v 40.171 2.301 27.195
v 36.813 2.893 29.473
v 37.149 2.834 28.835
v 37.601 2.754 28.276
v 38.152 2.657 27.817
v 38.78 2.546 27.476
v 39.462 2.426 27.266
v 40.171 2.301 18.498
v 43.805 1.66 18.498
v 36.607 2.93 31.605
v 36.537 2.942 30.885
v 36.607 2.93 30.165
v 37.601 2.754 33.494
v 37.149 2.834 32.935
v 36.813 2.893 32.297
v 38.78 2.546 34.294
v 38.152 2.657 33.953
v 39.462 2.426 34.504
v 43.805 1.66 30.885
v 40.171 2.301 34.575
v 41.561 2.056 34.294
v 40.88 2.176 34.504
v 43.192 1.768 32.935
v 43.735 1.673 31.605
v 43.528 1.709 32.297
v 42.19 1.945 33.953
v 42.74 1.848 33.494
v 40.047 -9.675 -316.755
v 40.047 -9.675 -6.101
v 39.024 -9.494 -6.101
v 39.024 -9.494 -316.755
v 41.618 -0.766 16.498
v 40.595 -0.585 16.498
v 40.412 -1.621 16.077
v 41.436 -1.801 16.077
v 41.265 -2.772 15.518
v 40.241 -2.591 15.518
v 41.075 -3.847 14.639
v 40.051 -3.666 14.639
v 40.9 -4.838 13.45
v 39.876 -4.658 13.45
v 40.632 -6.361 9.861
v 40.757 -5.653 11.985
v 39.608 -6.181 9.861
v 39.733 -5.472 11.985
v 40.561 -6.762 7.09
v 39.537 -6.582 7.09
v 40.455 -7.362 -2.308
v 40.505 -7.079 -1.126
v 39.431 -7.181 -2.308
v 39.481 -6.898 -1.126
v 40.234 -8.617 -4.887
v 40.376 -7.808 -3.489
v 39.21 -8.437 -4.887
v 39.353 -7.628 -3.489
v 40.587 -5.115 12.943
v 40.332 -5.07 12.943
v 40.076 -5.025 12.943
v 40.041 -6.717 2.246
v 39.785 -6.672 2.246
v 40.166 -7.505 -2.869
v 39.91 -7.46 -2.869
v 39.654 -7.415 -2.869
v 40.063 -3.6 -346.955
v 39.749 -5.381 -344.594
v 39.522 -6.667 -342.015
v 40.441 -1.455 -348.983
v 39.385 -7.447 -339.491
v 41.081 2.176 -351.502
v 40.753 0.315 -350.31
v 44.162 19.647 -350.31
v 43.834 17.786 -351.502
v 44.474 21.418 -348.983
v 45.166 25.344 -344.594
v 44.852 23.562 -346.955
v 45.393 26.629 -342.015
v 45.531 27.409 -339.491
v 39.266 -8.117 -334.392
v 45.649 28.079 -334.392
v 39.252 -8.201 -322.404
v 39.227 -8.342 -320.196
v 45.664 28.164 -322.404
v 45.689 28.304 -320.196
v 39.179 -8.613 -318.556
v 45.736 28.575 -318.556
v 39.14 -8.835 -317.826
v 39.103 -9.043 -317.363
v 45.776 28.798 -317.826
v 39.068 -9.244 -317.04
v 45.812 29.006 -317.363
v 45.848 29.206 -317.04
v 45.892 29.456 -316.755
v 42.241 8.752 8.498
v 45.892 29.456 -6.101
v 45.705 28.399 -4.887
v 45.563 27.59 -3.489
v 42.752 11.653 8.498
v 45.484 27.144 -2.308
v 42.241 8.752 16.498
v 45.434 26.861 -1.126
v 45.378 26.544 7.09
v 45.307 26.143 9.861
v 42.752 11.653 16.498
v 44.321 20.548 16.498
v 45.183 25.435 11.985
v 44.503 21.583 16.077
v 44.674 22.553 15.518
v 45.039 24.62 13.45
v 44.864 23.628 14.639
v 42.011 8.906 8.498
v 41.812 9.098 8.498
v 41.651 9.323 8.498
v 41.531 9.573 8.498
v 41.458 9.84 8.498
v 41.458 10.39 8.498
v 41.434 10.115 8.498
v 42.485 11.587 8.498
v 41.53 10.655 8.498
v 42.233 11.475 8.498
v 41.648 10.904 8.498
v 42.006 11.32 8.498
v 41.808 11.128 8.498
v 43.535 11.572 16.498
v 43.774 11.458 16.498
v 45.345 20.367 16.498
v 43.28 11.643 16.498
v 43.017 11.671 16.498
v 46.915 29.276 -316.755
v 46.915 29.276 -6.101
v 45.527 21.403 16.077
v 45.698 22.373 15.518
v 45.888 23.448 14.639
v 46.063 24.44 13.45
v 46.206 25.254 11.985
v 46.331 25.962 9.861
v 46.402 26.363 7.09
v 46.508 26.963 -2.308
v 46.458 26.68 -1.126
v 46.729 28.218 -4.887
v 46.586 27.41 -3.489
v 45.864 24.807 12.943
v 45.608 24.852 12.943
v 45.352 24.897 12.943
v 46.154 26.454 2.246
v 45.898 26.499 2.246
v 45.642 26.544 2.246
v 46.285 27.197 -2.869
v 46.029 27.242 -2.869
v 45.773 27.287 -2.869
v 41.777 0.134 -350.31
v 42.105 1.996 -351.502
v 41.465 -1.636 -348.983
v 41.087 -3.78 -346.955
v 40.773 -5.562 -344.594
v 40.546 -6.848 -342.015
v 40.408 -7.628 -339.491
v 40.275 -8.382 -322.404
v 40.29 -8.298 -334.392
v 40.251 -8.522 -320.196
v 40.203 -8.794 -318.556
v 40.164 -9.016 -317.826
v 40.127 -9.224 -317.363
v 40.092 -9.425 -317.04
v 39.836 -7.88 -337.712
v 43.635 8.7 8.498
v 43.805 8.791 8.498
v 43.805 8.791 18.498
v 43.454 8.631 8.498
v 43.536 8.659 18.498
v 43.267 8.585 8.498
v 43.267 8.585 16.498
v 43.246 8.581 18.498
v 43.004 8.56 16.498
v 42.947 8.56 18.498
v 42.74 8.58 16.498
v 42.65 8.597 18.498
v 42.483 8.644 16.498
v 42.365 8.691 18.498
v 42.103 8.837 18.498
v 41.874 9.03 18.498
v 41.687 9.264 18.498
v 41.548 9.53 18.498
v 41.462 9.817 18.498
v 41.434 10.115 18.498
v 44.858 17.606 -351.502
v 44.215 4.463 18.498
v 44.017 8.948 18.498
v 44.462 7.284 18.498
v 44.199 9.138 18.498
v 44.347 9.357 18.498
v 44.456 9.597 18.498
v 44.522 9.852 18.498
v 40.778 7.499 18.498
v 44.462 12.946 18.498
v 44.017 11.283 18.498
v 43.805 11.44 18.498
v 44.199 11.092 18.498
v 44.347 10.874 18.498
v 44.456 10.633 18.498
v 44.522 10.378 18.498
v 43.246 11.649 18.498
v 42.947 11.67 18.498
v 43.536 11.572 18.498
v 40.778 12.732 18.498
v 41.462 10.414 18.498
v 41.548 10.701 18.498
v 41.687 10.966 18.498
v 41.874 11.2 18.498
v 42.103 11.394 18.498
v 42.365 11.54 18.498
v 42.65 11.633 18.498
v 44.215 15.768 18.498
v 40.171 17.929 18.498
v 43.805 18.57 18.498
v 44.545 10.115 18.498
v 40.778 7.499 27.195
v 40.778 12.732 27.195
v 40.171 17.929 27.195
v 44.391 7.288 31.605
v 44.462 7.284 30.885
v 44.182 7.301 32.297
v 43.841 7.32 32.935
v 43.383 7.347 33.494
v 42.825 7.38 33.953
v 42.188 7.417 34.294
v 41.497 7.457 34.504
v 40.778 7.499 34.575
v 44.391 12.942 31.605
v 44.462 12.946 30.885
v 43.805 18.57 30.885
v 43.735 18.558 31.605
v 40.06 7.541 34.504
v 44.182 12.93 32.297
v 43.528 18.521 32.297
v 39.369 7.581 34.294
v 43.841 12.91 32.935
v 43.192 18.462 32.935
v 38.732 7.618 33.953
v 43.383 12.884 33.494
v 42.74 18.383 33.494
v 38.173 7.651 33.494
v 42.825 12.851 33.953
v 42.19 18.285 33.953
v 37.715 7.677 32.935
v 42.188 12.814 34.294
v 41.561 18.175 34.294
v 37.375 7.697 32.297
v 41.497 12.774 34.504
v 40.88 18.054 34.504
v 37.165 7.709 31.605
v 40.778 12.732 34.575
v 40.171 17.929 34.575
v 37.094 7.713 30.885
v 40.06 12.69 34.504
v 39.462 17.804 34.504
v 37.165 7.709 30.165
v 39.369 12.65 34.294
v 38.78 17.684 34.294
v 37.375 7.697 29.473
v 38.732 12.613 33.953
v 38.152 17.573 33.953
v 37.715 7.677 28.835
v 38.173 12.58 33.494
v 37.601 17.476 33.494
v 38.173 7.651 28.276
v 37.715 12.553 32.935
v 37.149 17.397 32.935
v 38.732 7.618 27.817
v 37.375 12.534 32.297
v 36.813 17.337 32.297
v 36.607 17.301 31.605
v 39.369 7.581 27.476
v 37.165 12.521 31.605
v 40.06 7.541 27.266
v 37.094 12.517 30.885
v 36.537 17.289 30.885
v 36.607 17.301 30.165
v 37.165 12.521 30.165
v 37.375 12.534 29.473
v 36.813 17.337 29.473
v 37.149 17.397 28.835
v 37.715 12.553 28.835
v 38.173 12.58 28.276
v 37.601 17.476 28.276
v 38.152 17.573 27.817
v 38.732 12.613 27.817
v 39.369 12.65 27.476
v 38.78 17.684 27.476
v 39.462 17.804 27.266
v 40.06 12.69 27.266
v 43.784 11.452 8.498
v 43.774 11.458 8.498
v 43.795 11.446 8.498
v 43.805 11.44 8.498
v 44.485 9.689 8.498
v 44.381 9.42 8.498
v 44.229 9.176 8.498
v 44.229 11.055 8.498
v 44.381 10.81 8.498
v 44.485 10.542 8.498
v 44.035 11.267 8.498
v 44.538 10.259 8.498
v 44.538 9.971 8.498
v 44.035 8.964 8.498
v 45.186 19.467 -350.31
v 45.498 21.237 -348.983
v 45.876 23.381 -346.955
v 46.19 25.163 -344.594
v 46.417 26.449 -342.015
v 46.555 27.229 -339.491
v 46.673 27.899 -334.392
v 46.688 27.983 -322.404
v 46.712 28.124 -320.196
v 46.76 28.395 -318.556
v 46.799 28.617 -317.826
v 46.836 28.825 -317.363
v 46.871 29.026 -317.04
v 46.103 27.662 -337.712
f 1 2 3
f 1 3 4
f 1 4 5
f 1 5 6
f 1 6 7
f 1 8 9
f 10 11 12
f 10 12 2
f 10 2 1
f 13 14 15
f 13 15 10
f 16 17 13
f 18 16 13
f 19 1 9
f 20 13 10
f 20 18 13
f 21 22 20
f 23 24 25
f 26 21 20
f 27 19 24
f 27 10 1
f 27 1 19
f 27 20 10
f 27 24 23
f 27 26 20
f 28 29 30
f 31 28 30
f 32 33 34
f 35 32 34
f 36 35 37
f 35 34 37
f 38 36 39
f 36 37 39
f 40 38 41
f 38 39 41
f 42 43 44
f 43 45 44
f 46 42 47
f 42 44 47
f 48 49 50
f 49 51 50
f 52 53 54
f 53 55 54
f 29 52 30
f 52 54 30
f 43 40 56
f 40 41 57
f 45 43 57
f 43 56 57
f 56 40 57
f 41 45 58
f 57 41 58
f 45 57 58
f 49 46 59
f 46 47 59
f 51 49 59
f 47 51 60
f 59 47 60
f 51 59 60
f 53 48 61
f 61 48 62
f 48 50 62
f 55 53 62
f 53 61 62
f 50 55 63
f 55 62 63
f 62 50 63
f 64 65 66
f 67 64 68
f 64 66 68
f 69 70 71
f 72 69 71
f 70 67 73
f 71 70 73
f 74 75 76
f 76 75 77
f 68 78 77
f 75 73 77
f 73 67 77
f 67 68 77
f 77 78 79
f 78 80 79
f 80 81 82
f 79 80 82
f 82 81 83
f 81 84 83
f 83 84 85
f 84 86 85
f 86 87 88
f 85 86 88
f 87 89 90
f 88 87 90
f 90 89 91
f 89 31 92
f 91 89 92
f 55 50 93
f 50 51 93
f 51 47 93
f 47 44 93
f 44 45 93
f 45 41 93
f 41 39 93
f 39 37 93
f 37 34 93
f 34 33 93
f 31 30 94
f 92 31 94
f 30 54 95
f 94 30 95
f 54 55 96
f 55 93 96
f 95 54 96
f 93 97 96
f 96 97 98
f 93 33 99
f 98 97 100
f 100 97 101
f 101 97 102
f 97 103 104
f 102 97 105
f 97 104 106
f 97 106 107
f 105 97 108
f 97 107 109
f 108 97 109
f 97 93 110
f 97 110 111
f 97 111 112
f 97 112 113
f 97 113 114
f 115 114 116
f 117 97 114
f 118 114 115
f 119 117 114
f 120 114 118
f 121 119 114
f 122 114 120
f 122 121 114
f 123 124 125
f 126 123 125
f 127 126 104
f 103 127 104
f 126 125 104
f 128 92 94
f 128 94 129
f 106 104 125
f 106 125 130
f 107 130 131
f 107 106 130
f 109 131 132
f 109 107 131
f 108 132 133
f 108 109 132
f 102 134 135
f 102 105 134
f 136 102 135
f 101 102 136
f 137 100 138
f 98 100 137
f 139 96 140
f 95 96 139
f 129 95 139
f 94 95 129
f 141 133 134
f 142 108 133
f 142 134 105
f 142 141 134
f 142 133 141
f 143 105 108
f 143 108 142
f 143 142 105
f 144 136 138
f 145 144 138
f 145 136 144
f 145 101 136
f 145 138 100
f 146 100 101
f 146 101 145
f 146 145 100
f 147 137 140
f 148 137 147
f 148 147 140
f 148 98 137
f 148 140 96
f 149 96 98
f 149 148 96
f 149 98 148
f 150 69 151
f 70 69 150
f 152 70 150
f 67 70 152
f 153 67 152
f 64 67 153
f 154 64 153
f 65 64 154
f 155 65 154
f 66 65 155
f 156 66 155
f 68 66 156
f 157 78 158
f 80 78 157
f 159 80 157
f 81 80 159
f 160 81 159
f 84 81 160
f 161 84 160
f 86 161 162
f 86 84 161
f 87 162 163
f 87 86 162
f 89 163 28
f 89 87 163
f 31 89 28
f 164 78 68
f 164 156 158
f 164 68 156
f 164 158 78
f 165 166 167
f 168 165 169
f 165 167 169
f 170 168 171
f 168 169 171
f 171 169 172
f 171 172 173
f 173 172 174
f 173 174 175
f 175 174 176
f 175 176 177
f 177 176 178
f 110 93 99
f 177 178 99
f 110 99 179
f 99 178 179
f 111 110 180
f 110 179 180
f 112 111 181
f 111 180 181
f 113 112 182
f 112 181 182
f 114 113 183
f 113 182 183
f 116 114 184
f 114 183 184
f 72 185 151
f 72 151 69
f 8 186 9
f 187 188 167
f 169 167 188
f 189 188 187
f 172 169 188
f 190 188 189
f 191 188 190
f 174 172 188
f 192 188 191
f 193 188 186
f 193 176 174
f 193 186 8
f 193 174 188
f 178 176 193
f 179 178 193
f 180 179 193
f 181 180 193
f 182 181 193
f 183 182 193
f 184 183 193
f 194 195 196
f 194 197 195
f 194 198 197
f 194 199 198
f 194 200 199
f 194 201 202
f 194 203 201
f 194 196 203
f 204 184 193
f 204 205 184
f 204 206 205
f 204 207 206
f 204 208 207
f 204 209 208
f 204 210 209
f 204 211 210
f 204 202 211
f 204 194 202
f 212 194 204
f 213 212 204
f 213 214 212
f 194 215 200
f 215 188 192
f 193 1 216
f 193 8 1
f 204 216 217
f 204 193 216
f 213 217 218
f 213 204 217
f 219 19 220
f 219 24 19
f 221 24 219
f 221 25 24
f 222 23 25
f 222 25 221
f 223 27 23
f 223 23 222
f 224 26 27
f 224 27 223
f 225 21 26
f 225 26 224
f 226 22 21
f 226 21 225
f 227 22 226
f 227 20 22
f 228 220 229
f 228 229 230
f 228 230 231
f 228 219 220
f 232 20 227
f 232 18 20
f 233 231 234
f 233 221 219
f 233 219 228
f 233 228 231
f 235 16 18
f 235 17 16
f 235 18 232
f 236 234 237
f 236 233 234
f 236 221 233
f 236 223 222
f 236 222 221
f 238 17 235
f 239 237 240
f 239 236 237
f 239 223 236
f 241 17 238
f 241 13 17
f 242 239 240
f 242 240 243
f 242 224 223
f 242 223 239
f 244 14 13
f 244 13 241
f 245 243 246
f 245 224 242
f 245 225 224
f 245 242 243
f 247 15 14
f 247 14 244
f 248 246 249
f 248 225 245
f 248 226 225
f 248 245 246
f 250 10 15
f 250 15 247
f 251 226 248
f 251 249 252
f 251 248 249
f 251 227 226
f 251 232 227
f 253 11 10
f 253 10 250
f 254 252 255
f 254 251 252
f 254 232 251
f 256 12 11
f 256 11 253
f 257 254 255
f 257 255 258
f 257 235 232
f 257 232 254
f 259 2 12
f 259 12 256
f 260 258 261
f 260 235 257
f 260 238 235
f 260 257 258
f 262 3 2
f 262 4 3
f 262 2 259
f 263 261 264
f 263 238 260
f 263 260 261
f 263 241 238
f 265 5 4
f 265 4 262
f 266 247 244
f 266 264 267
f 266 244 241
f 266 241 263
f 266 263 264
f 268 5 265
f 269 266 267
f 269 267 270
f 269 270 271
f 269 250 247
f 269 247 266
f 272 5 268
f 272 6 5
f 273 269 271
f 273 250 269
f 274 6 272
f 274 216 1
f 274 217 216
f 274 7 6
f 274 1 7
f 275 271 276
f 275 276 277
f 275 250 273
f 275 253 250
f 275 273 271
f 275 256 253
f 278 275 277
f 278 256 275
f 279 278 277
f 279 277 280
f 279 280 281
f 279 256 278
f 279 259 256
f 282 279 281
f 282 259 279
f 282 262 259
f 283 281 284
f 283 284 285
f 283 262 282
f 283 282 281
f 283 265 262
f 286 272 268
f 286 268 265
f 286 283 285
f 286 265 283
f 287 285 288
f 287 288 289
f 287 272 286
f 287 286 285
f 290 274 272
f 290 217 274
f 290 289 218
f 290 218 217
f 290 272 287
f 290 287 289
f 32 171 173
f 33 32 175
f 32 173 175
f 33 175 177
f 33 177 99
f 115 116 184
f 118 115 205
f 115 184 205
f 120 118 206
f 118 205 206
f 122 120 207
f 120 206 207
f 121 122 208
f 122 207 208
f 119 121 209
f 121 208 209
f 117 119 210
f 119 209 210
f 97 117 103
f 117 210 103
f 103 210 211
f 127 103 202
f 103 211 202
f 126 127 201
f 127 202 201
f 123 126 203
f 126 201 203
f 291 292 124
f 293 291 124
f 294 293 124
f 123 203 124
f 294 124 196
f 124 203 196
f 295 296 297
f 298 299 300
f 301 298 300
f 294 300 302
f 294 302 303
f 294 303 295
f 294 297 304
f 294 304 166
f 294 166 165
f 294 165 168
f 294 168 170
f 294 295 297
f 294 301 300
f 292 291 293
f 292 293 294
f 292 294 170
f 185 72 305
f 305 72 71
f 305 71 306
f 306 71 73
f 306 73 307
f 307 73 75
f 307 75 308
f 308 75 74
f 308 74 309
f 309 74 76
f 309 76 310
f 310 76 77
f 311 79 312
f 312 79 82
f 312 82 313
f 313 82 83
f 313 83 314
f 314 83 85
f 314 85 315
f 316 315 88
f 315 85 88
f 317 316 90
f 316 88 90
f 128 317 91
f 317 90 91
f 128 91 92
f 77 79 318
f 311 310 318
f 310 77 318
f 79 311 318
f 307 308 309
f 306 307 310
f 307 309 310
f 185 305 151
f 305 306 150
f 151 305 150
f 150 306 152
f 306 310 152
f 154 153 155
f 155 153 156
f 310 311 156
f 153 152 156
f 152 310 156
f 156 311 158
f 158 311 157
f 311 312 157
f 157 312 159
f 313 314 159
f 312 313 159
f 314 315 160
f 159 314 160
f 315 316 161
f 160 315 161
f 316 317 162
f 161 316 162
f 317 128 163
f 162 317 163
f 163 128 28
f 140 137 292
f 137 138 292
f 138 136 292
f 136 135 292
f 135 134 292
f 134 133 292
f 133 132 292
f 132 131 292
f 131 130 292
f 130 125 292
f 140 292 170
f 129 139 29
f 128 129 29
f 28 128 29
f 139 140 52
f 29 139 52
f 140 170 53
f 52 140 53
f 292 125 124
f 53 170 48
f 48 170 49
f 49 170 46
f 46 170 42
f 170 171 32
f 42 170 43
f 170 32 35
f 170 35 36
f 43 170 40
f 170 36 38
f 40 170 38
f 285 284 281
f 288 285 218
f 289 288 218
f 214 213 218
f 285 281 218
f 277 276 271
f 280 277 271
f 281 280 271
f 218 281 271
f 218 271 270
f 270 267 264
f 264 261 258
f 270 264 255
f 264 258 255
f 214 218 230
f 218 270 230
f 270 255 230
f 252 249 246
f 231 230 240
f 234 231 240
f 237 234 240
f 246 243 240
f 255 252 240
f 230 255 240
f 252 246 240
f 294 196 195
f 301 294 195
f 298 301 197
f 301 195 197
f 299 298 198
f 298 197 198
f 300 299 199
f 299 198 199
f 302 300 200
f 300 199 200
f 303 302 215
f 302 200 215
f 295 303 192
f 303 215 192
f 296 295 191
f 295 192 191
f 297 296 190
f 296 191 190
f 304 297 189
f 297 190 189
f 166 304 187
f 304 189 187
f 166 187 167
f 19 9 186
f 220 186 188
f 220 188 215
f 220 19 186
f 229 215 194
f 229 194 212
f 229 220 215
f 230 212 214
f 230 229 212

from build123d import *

# Parameters (mm, degrees)
REVOLVE_1_ANGLE          = 20
EXTRUDE_1_DEPTH          = 10
EXTRUDE_2_DEPTH          = 360
EXTRUDE_2_DEPTH_BACK     = 8
CUT_EXTRUDE_1_DEPTH      = 354.460525949
CUT_EXTRUDE_1_DEPTH_BACK = 354.460525949
CUT_EXTRUDE_2_DEPTH      = 354.460526061
CUT_EXTRUDE_2_DEPTH_BACK = 354.460526061


# Read off the part's stored shape, not the designer's step: 旋转1
with BuildPart() as part:
    # 旋转1 outline → 旋转1 (revolve)
    with BuildSketch(Plane(origin=(-4.145534285, 10.115302746, 0), x_dir=(0.9848077530122078, -0.17364817766693175, 0), z_dir=(-0.17364817766693175, -0.9848077530122078, 0))):
        with BuildLine():
            Line((48.69007377, 18.497782452), (48.69007377, 30.884801913))
            ThreePointArc((48.69007377, 30.884801913), (42.390721279, 33.49407915), (44.999998514, 27.194726658))
            Line((44.999998514, 27.194726658), (44.999998514, 18.497782452))
            Line((44.999998514, 18.497782452), (48.69007377, 18.497782452))
        make_face()
    revolve(axis=Axis((-4.145534285, 10.115302746, 0), (0, 0, 1)), revolution_arc=REVOLVE_1_ANGLE)

    # 草图2 → 凸台-拉伸1 (add)
    with BuildSketch(Plane(origin=(0, 0, 18.497782452), x_dir=(-1, 0, 0), z_dir=(0, 0, -1))):
        with BuildLine():
            Line((-43.804827858, 10.115302746), (-43.804827858, 8.790890094))
            ThreePointArc((-43.804827858, 8.790890094), (-42.230547682, 8.757264374), (-41.433540442, 10.115302746))
            Line((-41.433540442, 10.115302746), (-43.804827858, 10.115302746))
        make_face()
        with BuildLine():
            Line((-43.804827858, 11.439715397), (-43.804827858, 10.115302746))
            Line((-43.804827858, 10.115302746), (-41.433540442, 10.115302746))
            ThreePointArc((-41.433540442, 10.115302746), (-42.230547682, 11.473341118), (-43.804827858, 11.439715397))
        make_face()
        with BuildLine():
            ThreePointArc((-43.804827858, 11.439715397), (-44.544539485, 10.115302746), (-43.804827858, 8.790890094))
            Line((-43.804827858, 8.790890094), (-43.804827858, 10.115302746))
            Line((-43.804827858, 10.115302746), (-43.804827858, 11.439715397))
        make_face()
    extrude(amount=EXTRUDE_1_DEPTH)

    # 草图3 → 凸台-拉伸2 (add, two sides: drawn at the far end of the back side and taken through both)
    with BuildSketch(Plane(origin=(0, 0, 8.497782452), x_dir=(-1, 0, 0), z_dir=(0, 0, -1)).offset(-EXTRUDE_2_DEPTH_BACK)):
        Polygon((-45.891658823, 29.456257554), (-46.915436985, 29.275737842), (-40.047450695, -9.674547938), (-39.023672534, -9.494028226), align=None)
    extrude(amount=EXTRUDE_2_DEPTH + EXTRUDE_2_DEPTH_BACK)

    # 草图4 → 切除-拉伸1 (cut, two sides: drawn at the far end of the back side and taken through both)
    with BuildSketch(Plane(origin=(40.494317434, -7.140240729, 0), x_dir=(0, 0, -1), z_dir=(0.9848077530122087, -0.17364817766692764, 0)).offset(-CUT_EXTRUDE_1_DEPTH_BACK)):
        with BuildLine():
            Line((-16.497782452, 36.977753739), (-16.497782452, 27.931634297))
            add(Edge.make_bspline(
                [(-16.497782452, 27.931634297), (-15.119446691, 32.122246332), (-9.533617097, 34.35083792), (-2.34707738, 33.953128128), (2.582817502, 34.306427345), (5.20587008, 36.009348447), (6.100812574, 36.977753739)],
                knots=[0, 0, 0, 0, 0.299327733, 0.443712894, 0.582270155, 0.686413385, 0.686413385, 0.686413385, 0.686413385], degree=3))
            Line((6.100812574, 36.977753739), (-16.497782452, 36.977753739))
        make_face()
        with BuildLine():
            Line((-16.497782452, 6.472716459), (-16.497782452, -2.573402982))
            Line((-16.497782452, -2.573402982), (6.100812574, -2.573402982))
            add(Edge.make_bspline(
                [(-16.497782452, 6.472716459), (-15.119446691, 2.282104425), (-9.533617097, 0.053512837), (-2.34707738, 0.451222629), (2.582817502, 0.097923412), (5.20587008, -1.604997691), (6.100812574, -2.573402982)],
                knots=[0, 0, 0, 0, 0.299327733, 0.443712894, 0.582270155, 0.686413385, 0.686413385, 0.686413385, 0.686413385], degree=3))
        make_face()
    extrude(amount=CUT_EXTRUDE_1_DEPTH + CUT_EXTRUDE_1_DEPTH_BACK, mode=Mode.SUBTRACT)

    # 草图5 → 切除-拉伸2 (cut, two sides: drawn at the far end of the back side and taken through both)
    with BuildSketch(Plane(origin=(40.494317434, -7.140240729, 0), x_dir=(0, 0, -1), z_dir=(0.9848077530122087, -0.17364817766692764, 0)).offset(-CUT_EXTRUDE_2_DEPTH_BACK)):
        with BuildLine():
            Line((351.502217548, 36.977753739), (316.754779292, 36.977753739))
            add(Edge.make_bspline(
                [(351.502217548, 25.127512161), (347.967875432, 31.121714431), (339.410781642, 38.011527911), (319.00267796, 34.531851346), (316.754779292, 36.977753739)],
                knots=[0, 0, 0, 0, 0.348264384, 0.764472807, 0.764472807, 0.764472807, 0.764472807], degree=3))
            Line((351.502217548, 25.127512161), (351.502217548, 36.977753739))
        make_face()
        with BuildLine():
            Line((351.502217548, -2.573402982), (351.502217548, 9.276838596))
            add(Edge.make_bspline(
                [(351.502217548, 9.276838596), (347.967875432, 3.282636325), (339.410781642, -3.607177155), (319.00267796, -0.127500589), (316.754779292, -2.573402982)],
                knots=[0, 0, 0, 0, 0.348264384, 0.764472807, 0.764472807, 0.764472807, 0.764472807], degree=3))
            Line((316.754779292, -2.573402982), (351.502217548, -2.573402982))
        make_face()
    extrude(amount=CUT_EXTRUDE_2_DEPTH + CUT_EXTRUDE_2_DEPTH_BACK, mode=Mode.SUBTRACT)


solid = part.part
